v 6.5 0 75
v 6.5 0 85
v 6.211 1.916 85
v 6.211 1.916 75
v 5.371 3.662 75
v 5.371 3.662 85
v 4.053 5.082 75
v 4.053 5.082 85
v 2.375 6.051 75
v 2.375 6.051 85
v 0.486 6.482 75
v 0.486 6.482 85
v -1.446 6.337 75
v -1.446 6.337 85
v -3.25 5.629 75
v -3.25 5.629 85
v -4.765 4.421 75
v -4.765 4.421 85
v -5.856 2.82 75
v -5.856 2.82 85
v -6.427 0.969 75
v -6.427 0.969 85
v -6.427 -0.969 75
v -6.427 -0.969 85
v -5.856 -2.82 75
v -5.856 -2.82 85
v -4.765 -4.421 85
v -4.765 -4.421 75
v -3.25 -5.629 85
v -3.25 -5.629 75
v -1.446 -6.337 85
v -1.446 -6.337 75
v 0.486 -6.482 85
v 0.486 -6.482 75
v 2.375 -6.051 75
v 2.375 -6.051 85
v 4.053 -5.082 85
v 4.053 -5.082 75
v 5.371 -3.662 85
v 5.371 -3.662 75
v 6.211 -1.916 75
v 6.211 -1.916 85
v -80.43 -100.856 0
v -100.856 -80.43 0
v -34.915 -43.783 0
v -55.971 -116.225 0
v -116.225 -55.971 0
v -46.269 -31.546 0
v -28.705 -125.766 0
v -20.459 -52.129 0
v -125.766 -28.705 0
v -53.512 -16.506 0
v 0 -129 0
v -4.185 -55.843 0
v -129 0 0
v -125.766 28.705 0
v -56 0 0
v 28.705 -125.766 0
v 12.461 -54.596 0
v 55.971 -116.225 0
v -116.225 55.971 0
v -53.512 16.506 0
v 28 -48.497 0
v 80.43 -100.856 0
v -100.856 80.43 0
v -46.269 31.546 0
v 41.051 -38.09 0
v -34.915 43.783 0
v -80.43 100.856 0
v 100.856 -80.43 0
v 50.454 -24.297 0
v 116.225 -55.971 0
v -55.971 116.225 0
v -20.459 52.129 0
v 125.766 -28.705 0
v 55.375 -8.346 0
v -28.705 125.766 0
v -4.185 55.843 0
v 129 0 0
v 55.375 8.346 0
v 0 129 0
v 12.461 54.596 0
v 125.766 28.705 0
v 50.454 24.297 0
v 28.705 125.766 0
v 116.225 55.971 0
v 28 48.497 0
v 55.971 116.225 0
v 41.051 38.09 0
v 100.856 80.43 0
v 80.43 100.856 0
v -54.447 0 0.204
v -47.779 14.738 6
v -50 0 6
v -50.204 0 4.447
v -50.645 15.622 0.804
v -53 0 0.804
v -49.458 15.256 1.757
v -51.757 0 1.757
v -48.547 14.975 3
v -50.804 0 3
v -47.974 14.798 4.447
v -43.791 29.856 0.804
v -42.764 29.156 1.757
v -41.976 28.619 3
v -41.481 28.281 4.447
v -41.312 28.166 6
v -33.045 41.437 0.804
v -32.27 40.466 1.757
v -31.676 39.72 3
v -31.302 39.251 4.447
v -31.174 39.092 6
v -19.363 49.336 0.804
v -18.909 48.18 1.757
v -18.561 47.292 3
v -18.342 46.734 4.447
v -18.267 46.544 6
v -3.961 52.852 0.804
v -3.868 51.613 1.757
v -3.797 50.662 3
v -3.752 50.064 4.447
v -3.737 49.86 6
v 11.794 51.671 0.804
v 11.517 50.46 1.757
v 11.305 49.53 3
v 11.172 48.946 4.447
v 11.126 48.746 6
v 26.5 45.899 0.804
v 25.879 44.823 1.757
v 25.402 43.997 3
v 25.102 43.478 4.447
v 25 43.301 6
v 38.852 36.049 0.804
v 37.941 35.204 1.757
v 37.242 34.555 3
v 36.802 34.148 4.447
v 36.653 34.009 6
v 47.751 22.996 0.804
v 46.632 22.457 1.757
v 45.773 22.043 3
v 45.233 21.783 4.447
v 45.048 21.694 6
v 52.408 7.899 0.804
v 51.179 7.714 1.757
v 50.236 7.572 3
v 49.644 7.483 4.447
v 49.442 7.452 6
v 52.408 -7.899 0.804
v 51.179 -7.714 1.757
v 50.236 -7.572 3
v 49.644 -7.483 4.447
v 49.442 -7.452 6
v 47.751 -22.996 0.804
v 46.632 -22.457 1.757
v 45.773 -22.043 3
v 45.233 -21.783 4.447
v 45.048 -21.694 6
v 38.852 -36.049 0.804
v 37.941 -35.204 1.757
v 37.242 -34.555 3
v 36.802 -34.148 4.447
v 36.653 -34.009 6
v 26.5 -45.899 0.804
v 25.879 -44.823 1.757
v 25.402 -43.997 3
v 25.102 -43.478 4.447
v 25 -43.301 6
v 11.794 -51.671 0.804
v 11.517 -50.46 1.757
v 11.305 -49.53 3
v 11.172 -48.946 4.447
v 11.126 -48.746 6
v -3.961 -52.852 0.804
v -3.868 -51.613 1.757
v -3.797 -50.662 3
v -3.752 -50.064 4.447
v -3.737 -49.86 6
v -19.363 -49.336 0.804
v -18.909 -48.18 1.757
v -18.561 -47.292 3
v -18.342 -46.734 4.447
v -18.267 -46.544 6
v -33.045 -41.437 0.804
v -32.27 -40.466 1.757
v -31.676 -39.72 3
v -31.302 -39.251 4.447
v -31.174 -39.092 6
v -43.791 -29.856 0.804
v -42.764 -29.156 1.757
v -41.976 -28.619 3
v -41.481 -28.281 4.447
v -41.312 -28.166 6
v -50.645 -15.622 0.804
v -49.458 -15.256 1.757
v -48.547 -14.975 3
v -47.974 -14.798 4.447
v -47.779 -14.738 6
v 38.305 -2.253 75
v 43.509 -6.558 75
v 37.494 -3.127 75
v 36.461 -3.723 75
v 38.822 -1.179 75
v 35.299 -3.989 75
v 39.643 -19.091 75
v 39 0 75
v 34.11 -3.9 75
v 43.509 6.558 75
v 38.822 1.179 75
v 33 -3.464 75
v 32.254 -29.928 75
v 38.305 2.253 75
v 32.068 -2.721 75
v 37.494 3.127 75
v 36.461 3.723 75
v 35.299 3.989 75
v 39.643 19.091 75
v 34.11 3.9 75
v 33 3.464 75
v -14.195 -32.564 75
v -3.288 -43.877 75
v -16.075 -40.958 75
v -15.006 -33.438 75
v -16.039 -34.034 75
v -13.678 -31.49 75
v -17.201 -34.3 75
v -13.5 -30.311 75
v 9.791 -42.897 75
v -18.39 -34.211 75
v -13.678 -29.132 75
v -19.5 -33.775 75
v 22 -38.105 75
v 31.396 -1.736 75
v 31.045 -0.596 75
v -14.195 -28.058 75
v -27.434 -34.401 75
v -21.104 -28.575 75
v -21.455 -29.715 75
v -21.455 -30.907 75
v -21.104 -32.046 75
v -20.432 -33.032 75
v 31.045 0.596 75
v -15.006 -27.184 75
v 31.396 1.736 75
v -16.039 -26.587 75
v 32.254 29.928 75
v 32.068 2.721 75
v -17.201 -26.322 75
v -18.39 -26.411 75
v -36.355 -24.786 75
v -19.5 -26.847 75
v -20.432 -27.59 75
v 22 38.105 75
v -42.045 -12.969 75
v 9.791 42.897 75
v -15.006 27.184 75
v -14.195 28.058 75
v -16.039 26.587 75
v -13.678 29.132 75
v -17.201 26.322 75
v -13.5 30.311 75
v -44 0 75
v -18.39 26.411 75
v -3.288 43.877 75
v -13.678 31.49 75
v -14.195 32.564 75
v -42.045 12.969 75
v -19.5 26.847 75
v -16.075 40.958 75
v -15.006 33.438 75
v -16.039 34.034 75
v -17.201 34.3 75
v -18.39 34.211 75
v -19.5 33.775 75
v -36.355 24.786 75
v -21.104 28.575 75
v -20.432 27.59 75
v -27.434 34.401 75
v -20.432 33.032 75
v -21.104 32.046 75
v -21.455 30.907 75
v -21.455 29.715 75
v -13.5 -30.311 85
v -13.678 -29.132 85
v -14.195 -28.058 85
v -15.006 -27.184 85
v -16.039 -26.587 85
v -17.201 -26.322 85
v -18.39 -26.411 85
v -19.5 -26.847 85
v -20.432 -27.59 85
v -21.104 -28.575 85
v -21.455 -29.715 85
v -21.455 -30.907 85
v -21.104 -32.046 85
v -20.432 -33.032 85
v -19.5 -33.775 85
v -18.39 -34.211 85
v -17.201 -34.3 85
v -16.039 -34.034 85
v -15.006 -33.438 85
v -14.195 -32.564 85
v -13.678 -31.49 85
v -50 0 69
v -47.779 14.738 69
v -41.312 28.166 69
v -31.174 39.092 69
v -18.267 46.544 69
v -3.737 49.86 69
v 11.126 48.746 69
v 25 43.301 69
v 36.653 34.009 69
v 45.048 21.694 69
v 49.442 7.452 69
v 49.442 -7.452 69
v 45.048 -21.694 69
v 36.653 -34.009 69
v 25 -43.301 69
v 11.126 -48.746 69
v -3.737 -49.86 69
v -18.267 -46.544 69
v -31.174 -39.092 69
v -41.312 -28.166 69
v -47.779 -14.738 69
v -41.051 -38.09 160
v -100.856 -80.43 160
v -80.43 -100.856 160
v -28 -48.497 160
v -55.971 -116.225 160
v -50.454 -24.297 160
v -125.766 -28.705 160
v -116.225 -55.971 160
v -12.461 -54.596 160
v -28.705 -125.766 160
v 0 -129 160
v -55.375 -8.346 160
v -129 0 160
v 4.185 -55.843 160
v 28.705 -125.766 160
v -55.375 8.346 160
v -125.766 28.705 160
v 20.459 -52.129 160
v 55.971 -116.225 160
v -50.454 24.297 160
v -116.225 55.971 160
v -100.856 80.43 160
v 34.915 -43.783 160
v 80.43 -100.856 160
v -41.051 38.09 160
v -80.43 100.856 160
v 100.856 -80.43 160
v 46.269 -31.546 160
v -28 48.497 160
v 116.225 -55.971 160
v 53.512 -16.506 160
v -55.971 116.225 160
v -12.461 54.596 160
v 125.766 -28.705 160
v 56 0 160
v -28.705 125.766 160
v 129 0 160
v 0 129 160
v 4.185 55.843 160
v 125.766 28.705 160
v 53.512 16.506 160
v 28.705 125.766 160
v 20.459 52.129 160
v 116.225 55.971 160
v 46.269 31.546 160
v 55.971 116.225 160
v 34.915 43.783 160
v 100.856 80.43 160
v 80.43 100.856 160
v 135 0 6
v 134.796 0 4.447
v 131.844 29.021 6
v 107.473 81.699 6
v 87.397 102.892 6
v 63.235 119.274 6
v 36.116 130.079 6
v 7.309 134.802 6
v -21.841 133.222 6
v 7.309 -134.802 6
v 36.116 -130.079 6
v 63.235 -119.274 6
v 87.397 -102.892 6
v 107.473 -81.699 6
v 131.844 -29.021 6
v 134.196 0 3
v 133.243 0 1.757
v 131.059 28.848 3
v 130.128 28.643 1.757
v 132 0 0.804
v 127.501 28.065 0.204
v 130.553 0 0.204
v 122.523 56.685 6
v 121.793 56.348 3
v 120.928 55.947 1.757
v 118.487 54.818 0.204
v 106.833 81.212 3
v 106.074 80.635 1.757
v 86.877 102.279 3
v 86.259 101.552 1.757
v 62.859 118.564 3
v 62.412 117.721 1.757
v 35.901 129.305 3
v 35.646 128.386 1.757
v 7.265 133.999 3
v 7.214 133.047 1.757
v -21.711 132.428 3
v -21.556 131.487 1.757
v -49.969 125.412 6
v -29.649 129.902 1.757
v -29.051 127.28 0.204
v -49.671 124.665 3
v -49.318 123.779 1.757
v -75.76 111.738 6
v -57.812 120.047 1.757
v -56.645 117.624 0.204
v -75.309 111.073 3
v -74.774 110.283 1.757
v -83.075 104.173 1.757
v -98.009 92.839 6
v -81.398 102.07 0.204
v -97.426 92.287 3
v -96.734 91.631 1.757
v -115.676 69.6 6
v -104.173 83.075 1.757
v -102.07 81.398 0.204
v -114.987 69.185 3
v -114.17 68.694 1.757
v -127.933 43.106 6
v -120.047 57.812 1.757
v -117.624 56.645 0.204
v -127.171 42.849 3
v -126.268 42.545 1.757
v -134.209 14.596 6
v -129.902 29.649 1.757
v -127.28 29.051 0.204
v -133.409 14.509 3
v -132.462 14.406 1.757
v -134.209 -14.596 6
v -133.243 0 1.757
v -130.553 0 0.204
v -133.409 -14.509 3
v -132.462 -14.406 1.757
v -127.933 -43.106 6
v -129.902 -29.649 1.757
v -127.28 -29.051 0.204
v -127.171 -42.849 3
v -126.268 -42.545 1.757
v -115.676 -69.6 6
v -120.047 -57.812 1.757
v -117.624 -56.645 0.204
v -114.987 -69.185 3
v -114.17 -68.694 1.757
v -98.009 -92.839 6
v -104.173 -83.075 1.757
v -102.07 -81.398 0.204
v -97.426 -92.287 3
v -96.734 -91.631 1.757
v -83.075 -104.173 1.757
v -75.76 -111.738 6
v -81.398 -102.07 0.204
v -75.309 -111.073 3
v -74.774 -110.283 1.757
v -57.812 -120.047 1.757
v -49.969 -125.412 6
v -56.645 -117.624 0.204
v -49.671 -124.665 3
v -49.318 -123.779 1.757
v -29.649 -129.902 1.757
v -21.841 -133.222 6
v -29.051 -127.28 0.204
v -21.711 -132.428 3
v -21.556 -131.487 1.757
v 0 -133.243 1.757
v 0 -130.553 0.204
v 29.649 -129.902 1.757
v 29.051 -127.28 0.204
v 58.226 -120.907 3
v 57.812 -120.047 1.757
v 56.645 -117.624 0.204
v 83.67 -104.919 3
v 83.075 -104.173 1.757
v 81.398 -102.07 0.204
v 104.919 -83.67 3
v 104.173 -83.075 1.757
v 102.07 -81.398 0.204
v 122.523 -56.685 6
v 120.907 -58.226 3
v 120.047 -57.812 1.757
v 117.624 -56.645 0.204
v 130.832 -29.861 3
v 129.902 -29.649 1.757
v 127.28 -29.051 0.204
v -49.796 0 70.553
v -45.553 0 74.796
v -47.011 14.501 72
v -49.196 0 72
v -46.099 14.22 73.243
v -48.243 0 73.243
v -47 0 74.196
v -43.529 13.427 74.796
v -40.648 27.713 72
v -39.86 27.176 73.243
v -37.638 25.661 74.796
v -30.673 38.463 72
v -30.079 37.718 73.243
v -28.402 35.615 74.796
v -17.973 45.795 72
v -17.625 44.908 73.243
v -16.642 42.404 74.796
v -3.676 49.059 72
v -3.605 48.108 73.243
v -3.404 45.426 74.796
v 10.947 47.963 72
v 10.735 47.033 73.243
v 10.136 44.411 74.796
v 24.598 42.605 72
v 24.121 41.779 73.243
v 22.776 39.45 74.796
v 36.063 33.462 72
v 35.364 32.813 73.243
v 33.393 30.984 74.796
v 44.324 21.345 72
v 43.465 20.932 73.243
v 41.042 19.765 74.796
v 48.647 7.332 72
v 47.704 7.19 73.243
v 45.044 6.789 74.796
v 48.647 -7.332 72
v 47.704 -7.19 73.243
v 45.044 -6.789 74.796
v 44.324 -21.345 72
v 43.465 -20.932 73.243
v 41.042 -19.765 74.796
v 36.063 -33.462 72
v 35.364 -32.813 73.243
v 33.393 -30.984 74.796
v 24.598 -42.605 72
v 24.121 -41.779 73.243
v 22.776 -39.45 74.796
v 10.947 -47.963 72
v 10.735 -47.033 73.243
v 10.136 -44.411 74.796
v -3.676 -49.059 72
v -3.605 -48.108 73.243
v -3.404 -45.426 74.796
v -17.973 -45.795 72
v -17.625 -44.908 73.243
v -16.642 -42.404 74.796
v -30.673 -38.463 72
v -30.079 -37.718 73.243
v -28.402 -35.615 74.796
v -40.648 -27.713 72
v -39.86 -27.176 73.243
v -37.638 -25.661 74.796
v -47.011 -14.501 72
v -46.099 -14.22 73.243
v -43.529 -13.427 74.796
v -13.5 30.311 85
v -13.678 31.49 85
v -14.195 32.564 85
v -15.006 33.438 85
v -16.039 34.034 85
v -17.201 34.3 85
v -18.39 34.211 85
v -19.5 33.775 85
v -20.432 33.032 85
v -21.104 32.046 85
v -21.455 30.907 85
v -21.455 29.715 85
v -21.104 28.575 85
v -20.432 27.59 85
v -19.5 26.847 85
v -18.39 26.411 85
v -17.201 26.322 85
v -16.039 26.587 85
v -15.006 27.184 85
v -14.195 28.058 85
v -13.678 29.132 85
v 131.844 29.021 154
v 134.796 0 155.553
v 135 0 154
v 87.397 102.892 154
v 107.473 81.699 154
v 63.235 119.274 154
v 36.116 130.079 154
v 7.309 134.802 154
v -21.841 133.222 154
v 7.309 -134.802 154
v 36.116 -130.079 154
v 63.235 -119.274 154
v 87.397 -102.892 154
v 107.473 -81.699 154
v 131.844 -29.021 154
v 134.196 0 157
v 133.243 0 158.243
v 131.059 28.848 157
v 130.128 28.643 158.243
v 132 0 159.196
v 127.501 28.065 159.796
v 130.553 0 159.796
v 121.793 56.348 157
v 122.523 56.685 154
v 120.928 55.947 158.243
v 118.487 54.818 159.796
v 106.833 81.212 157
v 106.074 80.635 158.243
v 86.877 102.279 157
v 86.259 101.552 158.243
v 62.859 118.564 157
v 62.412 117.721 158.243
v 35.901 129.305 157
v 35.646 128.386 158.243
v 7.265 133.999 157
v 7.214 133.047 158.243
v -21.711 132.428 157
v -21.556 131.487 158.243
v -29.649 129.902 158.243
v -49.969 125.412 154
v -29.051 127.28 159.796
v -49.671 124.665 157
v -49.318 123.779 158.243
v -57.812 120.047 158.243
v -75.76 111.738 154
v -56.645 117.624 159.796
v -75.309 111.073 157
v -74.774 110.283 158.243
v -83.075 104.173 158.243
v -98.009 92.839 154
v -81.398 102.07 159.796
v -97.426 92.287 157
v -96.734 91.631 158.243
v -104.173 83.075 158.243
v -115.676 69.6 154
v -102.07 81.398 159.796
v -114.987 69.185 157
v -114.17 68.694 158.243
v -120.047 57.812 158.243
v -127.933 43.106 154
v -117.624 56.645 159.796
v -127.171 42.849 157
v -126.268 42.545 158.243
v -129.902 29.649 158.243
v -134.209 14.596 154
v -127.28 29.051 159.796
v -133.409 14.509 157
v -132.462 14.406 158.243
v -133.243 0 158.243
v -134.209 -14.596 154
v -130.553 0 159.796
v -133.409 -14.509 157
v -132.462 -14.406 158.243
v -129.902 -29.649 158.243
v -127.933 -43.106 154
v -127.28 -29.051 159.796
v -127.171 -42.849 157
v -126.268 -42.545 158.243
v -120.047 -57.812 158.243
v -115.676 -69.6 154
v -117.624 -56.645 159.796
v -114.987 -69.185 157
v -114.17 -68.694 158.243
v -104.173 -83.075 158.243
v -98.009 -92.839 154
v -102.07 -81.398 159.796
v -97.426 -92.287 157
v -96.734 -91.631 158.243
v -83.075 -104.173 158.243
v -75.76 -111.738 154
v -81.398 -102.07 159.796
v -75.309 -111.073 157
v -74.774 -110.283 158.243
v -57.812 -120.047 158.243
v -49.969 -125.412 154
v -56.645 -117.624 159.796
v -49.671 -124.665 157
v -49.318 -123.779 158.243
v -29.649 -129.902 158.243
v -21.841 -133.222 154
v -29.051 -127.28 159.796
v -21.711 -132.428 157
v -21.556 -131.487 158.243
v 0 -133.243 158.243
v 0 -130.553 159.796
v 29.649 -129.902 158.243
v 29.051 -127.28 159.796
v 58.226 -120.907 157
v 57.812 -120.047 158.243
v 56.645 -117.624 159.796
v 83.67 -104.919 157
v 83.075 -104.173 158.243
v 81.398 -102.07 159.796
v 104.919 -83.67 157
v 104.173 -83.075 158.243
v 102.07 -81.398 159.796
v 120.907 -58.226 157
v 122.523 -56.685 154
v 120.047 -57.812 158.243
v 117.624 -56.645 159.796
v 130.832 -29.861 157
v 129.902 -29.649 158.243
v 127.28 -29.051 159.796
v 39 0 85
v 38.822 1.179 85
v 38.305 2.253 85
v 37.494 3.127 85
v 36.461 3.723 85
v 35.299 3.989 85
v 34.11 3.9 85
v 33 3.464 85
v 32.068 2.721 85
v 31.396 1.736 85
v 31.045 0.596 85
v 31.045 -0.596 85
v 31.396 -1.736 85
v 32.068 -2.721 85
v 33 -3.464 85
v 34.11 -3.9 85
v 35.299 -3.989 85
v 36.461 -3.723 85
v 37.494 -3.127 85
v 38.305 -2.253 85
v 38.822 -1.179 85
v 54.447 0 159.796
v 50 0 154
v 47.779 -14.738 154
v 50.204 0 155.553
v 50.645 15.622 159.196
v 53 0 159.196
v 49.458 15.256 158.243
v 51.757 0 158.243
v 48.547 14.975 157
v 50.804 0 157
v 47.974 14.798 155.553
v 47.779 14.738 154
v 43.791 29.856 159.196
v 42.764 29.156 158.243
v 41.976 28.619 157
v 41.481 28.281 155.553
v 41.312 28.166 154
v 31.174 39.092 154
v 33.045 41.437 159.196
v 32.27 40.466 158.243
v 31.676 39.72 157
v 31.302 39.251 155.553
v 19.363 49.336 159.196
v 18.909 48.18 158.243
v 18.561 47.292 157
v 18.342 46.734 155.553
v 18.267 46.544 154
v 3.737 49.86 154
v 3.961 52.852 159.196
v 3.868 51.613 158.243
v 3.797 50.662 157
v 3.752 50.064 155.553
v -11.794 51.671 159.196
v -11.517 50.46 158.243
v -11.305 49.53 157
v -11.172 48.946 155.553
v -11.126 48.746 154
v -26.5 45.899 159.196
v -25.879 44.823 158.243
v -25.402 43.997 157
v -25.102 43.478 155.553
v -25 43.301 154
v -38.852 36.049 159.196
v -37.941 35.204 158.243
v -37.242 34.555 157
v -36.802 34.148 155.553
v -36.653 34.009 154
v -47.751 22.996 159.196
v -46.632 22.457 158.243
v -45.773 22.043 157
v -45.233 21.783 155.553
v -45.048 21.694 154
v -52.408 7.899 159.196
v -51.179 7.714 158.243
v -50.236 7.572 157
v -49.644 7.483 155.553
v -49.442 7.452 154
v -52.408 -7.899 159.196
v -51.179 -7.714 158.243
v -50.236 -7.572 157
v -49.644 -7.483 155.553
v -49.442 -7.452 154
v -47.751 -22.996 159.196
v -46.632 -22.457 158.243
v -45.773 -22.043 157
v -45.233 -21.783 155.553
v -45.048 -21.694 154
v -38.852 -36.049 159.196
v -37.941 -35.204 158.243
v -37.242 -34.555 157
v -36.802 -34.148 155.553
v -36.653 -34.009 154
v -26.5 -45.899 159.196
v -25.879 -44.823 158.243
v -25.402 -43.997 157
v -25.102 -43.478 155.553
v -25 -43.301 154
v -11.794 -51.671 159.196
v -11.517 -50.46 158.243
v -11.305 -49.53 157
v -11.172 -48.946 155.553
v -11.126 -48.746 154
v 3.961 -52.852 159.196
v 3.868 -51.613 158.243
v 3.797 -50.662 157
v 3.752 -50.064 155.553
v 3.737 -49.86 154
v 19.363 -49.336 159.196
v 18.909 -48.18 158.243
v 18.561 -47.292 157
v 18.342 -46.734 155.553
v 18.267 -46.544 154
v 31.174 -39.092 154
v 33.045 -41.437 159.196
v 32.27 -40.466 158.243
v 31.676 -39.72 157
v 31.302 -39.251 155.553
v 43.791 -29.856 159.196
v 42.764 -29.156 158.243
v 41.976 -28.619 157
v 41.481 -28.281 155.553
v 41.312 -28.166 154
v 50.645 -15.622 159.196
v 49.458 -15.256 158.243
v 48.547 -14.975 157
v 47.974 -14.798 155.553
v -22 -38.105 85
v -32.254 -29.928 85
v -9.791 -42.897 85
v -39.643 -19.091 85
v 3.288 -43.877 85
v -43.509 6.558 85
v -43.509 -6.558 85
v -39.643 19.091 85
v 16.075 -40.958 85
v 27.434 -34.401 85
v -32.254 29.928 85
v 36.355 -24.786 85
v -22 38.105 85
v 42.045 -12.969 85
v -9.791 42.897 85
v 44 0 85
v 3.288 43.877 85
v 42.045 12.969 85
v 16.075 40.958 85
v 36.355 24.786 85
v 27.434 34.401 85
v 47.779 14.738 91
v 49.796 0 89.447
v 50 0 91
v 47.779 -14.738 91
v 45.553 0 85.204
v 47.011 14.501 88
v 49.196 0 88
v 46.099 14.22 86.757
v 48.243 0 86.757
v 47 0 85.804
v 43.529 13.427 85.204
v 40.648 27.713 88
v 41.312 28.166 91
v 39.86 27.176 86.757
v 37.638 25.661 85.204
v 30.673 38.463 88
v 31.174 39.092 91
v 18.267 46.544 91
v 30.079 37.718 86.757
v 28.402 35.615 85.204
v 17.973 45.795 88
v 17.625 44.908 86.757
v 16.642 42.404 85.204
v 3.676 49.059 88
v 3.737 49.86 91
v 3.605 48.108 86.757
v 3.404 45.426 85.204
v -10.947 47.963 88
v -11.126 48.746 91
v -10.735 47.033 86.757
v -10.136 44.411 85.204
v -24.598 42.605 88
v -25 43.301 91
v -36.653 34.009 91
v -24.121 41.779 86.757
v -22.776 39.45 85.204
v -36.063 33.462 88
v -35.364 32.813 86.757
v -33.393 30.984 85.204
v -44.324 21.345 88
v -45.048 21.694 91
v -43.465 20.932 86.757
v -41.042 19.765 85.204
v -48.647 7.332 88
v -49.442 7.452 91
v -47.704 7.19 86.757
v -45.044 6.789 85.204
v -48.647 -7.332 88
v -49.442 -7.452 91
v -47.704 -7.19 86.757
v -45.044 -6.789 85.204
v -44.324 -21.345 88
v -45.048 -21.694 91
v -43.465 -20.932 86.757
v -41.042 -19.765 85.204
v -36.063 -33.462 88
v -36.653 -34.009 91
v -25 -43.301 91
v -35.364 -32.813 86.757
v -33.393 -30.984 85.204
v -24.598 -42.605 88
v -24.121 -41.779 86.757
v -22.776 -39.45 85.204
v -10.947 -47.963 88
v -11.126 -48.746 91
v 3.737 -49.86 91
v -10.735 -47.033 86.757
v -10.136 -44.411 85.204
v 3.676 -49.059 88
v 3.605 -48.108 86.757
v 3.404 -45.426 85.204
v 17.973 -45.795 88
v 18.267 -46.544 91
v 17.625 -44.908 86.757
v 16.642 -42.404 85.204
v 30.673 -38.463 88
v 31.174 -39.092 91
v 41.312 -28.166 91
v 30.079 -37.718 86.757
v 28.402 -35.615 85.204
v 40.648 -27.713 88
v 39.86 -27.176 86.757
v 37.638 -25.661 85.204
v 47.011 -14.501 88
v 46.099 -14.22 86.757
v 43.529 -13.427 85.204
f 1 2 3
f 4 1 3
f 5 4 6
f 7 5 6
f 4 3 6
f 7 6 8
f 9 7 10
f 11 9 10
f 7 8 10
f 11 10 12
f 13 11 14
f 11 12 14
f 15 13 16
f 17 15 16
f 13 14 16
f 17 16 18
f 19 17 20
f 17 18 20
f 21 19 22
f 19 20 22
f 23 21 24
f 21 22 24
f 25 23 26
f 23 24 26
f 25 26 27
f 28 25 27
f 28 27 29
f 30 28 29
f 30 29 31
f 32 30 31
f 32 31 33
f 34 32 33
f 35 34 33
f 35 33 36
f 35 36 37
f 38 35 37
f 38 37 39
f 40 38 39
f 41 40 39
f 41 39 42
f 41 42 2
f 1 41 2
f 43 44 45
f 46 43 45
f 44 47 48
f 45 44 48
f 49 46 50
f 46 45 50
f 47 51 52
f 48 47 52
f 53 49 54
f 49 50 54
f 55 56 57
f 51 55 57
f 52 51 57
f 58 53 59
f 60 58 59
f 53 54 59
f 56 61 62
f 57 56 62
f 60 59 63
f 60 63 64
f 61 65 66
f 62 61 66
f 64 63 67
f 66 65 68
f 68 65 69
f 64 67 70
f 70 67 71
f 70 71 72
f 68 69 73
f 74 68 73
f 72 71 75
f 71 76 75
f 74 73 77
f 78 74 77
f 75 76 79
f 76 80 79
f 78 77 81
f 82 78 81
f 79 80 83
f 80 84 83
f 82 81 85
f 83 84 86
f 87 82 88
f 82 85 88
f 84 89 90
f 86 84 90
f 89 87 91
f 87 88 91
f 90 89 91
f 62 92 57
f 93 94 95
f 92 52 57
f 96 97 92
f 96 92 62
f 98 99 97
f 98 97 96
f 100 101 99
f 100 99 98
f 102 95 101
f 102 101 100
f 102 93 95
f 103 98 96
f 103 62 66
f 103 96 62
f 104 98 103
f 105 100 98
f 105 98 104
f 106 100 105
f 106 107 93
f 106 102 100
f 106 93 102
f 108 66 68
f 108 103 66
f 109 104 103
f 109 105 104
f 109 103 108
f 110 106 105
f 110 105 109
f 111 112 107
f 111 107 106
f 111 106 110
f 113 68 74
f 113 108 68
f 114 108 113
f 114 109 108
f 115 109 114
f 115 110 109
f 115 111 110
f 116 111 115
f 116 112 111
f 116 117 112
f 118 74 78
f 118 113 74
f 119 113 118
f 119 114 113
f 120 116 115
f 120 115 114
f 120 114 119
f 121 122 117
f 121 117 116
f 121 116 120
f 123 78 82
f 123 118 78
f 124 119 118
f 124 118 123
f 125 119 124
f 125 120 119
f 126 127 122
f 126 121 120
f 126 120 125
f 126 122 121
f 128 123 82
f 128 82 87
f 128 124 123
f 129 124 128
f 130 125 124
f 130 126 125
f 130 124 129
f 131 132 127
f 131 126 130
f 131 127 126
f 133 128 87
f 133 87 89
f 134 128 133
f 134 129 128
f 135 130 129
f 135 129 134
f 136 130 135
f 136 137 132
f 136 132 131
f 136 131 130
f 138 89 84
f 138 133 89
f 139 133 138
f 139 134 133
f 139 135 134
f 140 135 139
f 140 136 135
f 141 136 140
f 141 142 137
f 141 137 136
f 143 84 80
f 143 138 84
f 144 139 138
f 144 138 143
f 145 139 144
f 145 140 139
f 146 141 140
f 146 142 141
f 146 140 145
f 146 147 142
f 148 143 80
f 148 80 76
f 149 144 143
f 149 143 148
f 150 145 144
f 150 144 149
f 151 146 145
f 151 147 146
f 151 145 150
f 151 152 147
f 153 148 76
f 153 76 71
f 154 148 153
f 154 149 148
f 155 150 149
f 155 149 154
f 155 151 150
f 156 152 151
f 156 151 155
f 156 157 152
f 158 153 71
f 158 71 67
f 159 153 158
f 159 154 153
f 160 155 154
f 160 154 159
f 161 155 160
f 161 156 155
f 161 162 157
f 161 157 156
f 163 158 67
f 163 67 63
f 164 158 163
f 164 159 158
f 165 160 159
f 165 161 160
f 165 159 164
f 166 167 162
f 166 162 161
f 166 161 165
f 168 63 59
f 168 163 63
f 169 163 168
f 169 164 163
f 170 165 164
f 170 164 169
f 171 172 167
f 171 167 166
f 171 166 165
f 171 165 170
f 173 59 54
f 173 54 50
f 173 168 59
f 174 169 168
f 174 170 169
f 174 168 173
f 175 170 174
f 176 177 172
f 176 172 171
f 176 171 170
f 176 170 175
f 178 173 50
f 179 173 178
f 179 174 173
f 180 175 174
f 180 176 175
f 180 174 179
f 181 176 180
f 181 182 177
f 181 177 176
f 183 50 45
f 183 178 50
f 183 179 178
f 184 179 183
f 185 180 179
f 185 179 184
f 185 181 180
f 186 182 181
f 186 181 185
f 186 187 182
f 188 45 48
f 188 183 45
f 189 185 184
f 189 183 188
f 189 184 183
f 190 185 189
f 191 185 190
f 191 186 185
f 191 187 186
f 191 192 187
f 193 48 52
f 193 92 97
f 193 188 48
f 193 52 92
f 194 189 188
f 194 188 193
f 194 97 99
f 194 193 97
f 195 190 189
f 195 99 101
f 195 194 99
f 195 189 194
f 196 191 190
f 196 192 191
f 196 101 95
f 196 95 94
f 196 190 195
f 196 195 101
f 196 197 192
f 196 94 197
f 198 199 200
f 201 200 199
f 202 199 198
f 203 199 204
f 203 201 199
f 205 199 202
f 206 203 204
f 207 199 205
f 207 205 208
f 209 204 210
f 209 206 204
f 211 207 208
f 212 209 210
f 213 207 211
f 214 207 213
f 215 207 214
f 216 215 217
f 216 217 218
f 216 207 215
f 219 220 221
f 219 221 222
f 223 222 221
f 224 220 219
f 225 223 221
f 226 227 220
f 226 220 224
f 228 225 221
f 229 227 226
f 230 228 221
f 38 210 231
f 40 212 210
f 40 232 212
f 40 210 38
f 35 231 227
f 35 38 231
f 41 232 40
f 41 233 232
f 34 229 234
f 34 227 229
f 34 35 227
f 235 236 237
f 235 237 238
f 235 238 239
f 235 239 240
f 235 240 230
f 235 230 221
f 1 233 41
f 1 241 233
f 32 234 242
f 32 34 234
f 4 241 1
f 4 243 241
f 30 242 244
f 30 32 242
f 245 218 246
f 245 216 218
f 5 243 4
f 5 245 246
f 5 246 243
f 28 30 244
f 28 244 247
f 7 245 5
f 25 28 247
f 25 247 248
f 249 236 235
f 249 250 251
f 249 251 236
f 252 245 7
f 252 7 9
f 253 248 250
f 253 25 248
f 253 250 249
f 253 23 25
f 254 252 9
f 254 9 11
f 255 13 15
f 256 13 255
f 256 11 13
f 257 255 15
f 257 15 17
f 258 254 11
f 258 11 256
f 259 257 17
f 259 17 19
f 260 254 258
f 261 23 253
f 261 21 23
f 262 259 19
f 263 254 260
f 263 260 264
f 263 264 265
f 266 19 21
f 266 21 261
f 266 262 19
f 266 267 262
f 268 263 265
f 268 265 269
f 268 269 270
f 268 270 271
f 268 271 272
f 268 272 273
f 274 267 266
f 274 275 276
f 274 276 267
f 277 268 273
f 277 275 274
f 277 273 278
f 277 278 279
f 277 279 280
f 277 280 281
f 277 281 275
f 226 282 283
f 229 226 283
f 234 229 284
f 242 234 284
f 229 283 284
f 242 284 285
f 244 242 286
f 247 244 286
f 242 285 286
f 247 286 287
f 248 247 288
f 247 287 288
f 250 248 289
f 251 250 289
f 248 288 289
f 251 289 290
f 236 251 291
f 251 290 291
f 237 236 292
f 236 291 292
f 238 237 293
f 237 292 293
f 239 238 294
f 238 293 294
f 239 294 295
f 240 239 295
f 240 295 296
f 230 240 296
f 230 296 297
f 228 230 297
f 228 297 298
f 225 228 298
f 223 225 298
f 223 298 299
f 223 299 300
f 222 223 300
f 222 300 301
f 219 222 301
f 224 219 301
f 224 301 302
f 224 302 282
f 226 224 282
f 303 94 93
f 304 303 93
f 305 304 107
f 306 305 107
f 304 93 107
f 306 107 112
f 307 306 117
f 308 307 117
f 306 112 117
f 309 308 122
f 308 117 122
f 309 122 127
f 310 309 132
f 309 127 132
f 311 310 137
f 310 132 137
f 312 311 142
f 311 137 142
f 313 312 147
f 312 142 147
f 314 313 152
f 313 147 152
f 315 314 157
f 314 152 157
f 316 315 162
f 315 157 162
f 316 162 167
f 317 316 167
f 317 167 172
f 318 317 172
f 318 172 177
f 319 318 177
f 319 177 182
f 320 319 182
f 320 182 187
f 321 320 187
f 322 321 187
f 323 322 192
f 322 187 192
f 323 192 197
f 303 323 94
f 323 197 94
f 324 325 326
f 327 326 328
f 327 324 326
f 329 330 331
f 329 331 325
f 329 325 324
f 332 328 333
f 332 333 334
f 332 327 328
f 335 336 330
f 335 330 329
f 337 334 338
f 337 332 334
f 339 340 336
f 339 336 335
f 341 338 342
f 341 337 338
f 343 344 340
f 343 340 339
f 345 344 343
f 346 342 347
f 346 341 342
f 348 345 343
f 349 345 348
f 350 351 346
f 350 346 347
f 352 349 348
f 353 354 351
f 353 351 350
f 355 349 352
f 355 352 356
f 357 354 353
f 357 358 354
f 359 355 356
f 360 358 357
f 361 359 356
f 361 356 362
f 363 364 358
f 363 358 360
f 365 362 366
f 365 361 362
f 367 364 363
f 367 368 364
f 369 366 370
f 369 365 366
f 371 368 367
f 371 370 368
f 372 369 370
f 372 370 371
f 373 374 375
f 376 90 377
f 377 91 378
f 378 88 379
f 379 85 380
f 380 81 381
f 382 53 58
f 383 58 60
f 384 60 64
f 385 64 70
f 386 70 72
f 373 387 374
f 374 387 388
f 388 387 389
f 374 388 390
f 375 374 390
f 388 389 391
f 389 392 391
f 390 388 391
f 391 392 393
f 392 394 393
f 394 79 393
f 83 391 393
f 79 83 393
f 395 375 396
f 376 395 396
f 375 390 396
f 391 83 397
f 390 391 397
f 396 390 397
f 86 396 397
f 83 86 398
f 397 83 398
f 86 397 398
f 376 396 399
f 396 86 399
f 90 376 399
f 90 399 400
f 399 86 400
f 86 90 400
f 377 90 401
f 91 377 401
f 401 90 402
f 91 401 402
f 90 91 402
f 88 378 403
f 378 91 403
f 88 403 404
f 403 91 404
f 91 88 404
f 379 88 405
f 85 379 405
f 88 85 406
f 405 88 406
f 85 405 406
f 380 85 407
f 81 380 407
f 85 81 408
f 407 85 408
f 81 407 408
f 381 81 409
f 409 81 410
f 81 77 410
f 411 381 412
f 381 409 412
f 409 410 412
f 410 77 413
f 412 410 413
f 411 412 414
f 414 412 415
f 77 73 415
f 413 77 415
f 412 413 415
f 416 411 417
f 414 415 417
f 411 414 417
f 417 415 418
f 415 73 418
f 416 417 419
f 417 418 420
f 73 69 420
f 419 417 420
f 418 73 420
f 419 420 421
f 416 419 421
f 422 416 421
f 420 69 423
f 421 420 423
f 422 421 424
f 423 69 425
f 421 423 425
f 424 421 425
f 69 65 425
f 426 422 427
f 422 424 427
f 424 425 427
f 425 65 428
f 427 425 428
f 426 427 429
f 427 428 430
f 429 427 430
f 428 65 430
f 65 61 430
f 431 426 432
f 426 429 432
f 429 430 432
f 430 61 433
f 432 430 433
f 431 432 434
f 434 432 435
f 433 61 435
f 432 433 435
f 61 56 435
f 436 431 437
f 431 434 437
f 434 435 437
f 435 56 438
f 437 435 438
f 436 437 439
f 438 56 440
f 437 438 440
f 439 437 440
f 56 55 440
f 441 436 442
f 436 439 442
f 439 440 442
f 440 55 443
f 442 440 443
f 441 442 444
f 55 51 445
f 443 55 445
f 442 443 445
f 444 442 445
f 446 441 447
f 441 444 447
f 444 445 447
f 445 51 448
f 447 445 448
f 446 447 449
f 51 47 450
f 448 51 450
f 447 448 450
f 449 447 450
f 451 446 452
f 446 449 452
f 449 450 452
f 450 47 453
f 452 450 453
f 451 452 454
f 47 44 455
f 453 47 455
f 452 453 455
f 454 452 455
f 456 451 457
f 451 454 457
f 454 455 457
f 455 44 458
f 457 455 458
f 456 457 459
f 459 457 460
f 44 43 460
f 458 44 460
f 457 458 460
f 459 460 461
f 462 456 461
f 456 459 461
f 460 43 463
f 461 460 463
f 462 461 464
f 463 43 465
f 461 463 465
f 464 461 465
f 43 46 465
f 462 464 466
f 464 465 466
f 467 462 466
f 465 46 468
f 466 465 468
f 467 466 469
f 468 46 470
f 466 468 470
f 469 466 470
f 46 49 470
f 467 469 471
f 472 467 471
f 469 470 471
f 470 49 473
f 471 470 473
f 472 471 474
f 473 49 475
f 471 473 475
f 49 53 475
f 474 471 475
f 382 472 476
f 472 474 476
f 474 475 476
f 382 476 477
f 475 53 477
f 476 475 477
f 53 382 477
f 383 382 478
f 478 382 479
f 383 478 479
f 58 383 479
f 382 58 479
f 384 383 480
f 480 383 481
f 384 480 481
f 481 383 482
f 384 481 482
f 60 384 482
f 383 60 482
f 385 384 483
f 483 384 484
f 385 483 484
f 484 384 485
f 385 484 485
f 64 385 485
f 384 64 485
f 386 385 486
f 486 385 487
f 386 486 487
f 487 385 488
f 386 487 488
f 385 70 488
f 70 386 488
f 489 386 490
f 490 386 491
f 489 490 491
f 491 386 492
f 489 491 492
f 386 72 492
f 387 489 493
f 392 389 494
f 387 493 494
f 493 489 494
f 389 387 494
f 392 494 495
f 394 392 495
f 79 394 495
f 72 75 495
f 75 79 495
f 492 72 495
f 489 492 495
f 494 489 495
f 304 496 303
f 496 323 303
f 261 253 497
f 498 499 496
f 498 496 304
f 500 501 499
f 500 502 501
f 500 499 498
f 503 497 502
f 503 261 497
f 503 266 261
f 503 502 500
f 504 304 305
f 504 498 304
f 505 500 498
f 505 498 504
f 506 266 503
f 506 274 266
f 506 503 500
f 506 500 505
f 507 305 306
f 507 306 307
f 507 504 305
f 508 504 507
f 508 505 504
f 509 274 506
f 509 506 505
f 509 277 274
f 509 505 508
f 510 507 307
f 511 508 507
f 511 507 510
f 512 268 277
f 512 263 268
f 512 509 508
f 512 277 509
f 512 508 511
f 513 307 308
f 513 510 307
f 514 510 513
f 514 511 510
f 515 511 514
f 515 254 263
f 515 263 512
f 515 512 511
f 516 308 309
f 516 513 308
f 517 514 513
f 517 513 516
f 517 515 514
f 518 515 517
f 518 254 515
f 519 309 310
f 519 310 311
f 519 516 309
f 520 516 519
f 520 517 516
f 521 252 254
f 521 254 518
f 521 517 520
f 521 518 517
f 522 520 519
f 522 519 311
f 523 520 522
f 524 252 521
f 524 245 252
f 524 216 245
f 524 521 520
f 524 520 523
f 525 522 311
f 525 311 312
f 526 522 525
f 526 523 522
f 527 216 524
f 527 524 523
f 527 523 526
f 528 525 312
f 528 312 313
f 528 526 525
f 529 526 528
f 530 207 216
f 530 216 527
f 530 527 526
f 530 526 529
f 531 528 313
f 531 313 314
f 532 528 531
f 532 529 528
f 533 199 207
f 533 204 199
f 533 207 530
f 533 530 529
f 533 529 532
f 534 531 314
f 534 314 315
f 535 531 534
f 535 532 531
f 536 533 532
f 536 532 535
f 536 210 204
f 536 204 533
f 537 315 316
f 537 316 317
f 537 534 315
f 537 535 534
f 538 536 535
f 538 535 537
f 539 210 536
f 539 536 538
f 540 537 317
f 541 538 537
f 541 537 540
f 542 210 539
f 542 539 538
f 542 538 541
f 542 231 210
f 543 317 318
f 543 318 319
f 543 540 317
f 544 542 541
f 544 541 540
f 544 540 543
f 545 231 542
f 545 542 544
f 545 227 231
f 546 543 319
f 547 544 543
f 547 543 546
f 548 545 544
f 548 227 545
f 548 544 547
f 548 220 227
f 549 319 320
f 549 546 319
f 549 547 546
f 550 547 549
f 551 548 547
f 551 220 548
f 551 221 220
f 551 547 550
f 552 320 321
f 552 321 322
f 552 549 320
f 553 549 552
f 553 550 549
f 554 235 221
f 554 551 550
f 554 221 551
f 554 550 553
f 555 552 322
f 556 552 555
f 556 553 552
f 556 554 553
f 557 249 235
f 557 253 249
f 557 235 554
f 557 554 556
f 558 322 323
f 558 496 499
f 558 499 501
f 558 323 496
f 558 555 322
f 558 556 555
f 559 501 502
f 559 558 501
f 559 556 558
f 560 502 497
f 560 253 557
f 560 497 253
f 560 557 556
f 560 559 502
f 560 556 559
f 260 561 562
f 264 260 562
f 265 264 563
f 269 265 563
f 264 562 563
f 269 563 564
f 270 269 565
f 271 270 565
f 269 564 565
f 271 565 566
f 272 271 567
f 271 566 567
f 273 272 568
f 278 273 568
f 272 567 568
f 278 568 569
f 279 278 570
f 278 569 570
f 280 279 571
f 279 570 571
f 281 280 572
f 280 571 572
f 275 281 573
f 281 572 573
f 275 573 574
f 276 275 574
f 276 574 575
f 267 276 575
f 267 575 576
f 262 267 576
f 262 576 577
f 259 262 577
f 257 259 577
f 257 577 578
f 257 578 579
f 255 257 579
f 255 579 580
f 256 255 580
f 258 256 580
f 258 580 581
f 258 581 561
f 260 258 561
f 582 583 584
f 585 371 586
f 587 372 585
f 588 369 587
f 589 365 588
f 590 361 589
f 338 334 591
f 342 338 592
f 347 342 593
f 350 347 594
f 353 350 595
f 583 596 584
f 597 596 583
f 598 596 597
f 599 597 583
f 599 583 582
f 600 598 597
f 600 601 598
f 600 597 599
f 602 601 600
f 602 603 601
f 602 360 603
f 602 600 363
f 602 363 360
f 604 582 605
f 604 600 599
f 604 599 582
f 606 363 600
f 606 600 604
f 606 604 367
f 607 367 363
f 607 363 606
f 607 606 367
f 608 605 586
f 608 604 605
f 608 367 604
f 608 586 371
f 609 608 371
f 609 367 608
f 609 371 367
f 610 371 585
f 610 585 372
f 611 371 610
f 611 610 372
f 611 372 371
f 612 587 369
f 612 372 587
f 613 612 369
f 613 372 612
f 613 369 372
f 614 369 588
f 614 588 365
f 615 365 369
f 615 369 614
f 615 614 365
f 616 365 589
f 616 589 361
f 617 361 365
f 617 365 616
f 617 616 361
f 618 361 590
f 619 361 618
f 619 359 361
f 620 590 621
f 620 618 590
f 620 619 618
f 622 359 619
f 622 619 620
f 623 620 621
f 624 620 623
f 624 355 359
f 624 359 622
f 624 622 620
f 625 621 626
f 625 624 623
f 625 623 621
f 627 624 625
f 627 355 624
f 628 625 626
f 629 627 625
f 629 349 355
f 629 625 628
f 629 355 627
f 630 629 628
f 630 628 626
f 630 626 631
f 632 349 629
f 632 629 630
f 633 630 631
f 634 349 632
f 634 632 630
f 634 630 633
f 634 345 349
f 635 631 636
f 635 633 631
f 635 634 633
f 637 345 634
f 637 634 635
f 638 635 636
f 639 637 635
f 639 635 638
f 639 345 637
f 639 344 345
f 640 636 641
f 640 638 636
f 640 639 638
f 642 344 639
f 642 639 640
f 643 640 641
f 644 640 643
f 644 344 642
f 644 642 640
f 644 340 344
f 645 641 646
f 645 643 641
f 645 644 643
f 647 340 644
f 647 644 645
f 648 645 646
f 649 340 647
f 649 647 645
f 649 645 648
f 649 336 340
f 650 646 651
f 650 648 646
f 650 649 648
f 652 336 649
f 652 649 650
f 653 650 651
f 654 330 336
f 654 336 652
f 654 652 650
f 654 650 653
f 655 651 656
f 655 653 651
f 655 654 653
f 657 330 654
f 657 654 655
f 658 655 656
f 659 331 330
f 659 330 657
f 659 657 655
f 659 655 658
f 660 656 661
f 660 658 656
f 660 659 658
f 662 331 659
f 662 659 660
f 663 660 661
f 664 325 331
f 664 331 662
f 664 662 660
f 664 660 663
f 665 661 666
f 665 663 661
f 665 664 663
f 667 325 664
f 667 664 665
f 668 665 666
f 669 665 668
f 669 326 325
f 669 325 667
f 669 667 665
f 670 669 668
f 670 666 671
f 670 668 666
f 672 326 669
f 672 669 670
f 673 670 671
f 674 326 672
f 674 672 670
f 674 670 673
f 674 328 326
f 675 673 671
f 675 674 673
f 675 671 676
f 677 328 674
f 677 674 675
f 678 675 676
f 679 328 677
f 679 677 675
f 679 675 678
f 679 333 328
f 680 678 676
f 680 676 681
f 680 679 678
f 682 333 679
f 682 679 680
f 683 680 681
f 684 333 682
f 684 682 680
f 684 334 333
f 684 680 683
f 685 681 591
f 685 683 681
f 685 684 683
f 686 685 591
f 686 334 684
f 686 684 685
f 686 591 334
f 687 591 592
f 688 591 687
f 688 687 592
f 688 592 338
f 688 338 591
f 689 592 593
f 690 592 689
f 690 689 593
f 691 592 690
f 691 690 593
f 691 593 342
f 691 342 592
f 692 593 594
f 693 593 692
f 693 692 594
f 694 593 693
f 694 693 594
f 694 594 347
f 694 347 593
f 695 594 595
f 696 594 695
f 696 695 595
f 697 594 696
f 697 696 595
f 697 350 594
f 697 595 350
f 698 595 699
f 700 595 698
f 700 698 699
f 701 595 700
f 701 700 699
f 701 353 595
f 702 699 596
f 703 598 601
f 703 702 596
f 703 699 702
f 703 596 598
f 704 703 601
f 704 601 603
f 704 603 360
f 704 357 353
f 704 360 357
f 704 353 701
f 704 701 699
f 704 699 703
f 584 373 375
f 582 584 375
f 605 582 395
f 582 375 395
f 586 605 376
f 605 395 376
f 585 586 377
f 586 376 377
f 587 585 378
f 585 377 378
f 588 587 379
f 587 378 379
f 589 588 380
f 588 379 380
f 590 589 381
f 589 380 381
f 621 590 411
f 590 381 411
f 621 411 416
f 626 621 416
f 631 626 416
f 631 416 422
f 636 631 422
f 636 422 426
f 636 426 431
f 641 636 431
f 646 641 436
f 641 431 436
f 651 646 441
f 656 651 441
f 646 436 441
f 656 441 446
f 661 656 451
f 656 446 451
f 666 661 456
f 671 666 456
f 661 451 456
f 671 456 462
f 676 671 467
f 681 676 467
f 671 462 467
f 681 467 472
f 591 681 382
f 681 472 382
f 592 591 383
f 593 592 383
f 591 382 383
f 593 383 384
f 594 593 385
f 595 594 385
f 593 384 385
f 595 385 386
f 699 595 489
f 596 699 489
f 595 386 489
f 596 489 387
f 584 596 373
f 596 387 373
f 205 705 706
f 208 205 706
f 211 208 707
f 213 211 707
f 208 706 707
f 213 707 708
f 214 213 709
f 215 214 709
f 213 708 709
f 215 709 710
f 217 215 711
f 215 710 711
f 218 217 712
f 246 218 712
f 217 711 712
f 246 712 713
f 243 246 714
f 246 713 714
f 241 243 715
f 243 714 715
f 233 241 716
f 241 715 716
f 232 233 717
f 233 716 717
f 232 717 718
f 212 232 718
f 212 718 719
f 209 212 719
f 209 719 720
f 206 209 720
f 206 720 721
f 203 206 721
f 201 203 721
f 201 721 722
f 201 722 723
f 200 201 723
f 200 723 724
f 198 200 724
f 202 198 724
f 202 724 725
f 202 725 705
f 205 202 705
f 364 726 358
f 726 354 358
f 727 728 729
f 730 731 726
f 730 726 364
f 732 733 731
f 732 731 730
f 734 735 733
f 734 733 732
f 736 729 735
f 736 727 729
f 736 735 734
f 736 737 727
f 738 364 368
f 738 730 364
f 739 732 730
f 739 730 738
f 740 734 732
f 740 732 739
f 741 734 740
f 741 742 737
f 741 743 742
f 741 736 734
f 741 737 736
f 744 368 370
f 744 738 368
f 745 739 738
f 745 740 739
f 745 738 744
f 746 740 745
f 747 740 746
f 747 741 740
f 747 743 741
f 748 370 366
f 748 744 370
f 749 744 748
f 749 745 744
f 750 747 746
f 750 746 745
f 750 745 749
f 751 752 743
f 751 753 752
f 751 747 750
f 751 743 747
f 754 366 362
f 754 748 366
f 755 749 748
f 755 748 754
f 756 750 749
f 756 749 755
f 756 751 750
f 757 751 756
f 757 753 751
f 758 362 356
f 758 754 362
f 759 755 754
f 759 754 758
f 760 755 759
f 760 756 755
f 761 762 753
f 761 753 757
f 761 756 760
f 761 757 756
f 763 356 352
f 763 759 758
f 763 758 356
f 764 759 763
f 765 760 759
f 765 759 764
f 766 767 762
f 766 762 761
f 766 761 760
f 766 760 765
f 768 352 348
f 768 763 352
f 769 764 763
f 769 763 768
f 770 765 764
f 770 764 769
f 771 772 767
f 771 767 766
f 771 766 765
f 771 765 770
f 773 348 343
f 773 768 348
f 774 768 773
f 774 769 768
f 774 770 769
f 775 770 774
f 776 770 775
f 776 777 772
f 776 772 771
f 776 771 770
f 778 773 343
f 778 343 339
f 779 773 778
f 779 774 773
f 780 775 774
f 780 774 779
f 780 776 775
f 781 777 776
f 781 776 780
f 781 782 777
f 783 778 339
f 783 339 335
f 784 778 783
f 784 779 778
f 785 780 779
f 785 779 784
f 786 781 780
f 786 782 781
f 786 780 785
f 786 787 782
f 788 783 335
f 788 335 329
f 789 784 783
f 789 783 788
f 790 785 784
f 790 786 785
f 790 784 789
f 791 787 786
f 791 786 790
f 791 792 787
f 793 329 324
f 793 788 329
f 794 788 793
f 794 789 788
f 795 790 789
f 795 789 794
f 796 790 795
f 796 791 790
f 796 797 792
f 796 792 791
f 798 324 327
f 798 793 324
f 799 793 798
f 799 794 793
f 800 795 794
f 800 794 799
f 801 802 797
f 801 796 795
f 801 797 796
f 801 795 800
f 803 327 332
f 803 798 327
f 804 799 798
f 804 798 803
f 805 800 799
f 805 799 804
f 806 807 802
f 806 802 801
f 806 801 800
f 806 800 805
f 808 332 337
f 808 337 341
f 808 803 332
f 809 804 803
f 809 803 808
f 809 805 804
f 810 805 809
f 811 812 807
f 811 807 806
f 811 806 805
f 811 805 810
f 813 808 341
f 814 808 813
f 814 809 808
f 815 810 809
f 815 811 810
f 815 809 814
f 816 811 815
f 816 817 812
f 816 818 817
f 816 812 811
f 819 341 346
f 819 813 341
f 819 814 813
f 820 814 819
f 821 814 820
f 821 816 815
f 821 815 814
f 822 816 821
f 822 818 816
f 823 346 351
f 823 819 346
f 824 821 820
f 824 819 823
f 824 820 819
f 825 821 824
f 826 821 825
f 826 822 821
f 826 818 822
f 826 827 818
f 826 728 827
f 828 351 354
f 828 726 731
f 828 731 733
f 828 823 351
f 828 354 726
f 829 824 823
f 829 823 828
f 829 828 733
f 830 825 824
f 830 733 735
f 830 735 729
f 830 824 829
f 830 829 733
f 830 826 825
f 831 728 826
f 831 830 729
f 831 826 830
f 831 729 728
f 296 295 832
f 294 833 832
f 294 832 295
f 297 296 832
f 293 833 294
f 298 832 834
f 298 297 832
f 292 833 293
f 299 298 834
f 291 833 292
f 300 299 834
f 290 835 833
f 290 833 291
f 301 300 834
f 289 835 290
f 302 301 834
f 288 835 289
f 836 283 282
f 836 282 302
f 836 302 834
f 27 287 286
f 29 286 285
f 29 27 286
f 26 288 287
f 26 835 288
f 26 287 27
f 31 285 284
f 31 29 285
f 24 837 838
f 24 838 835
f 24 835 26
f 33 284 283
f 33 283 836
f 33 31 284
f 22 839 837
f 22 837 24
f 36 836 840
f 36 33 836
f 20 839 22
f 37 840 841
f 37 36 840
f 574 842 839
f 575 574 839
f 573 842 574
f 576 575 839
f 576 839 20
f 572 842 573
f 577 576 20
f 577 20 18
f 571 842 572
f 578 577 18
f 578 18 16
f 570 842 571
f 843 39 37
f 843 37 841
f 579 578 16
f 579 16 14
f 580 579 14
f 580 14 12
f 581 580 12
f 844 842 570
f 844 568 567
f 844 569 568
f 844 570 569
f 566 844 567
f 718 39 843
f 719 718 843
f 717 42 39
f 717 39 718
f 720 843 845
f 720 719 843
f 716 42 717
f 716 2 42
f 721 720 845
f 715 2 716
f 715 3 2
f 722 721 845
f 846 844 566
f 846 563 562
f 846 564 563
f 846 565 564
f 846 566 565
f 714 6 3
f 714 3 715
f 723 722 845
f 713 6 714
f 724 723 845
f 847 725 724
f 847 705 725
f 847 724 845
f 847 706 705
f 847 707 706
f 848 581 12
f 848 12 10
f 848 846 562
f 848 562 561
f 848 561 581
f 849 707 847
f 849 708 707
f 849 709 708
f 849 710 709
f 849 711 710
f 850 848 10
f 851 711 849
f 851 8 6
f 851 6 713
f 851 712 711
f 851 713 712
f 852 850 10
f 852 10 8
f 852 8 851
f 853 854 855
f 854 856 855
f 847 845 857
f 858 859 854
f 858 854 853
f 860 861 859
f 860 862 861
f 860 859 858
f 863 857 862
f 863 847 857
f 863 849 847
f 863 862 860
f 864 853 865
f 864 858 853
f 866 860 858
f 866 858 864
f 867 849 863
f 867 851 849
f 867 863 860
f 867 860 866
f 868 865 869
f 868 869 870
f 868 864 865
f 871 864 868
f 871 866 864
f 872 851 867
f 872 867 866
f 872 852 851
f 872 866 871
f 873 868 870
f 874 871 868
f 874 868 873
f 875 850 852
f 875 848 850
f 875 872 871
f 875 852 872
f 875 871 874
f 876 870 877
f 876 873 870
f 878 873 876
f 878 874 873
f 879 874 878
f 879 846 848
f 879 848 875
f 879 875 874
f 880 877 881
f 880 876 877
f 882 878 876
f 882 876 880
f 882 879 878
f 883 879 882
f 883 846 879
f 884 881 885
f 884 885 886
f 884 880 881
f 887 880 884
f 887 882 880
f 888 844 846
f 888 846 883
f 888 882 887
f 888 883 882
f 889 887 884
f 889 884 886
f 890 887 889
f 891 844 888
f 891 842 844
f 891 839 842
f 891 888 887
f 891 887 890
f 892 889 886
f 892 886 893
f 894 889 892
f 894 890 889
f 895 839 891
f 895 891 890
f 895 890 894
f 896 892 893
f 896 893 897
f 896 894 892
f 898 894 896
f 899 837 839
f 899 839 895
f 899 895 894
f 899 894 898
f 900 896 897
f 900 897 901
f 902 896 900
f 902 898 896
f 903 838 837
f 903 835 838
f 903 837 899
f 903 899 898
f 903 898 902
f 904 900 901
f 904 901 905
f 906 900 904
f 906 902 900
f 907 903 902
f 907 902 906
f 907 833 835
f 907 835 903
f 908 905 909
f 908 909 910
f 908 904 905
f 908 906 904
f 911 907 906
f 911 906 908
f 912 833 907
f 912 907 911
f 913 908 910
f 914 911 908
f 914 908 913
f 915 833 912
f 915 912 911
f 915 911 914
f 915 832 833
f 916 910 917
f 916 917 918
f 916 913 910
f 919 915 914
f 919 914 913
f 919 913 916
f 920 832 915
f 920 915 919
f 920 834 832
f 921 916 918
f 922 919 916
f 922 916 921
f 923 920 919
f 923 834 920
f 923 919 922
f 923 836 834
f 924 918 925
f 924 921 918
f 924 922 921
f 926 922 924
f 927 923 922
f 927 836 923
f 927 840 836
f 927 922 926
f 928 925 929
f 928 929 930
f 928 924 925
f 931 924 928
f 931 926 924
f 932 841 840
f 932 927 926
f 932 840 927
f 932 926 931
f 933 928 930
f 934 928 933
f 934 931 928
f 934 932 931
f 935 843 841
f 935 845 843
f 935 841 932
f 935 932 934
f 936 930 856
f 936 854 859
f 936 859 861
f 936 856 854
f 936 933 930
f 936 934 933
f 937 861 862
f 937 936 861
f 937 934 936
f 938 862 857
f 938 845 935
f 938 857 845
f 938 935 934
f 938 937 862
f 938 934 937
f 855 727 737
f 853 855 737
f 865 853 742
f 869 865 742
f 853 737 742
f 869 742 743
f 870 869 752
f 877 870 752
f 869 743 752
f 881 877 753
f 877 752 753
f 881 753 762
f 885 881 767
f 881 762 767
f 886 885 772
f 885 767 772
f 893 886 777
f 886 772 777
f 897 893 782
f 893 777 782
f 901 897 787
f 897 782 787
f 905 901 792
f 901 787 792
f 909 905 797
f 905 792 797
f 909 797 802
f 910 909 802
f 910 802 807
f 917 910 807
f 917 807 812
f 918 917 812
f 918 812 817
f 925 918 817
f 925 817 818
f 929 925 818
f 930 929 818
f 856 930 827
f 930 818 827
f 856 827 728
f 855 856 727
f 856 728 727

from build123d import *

# Parameters (mm, degrees)
SKETCH1_R           = 135
BOSS_EXTRUDE2_DEPTH = 160
SKETCH3_R           = 50
CUT_EXTRUDE1_DEPTH  = 75
SKETCH4_R           = 50
CUT_EXTRUDE2_DEPTH  = 75
FILLET1_R           = 6
SKETCH5_R           = 4
CUT_EXTRUDE3_DEPTH  = 45
SKETCH6_R           = 6.5
CUT_EXTRUDE4_DEPTH  = 86


with BuildPart() as part:
    # Sketch1 → Boss-Extrude2 (new body)
    with BuildSketch(Plane.XY):
        Circle(SKETCH1_R)
    extrude(amount=BOSS_EXTRUDE2_DEPTH)

    # Sketch3 → Cut-Extrude1 (cut)
    with BuildSketch(Plane.XY.offset(160)):
        Circle(SKETCH3_R)
    extrude(amount=-CUT_EXTRUDE1_DEPTH, mode=Mode.SUBTRACT)

    # Sketch4 → Cut-Extrude2 (cut)
    with BuildSketch(Plane(origin=(0, 0, 0), x_dir=(-1, 0, 0), z_dir=(0, 0, -1))):
        Circle(SKETCH4_R)
    extrude(amount=-CUT_EXTRUDE2_DEPTH, mode=Mode.SUBTRACT)

    # Fillet1
    fillet1_edges = [part.edges().sort_by_distance(p)[0] for p in [
        (50, 0, 75),
        (50, 0, 0),
        (-135, 0, 0),
        (-135, 0, 160),
        (-50, 0, 85),
        (-50, 0, 160),
    ]]
    fillet(fillet1_edges, radius=FILLET1_R)

    # Sketch5 → Cut-Extrude3 (cut)
    with BuildSketch(Plane.XY.offset(85)):
        with Locations((35, 0)):
            Circle(SKETCH5_R)
        with Locations((-17.5, -30.310889132)):
            Circle(SKETCH5_R)
        with Locations((-17.5, 30.310889132)):
            Circle(SKETCH5_R)
    extrude(amount=-CUT_EXTRUDE3_DEPTH, mode=Mode.SUBTRACT)

    # Sketch6 → Cut-Extrude4 (cut, through all)
    with BuildSketch(Plane.XY.offset(85)):
        Circle(SKETCH6_R)
    extrude(amount=-CUT_EXTRUDE4_DEPTH, mode=Mode.SUBTRACT)


solid = part.part
